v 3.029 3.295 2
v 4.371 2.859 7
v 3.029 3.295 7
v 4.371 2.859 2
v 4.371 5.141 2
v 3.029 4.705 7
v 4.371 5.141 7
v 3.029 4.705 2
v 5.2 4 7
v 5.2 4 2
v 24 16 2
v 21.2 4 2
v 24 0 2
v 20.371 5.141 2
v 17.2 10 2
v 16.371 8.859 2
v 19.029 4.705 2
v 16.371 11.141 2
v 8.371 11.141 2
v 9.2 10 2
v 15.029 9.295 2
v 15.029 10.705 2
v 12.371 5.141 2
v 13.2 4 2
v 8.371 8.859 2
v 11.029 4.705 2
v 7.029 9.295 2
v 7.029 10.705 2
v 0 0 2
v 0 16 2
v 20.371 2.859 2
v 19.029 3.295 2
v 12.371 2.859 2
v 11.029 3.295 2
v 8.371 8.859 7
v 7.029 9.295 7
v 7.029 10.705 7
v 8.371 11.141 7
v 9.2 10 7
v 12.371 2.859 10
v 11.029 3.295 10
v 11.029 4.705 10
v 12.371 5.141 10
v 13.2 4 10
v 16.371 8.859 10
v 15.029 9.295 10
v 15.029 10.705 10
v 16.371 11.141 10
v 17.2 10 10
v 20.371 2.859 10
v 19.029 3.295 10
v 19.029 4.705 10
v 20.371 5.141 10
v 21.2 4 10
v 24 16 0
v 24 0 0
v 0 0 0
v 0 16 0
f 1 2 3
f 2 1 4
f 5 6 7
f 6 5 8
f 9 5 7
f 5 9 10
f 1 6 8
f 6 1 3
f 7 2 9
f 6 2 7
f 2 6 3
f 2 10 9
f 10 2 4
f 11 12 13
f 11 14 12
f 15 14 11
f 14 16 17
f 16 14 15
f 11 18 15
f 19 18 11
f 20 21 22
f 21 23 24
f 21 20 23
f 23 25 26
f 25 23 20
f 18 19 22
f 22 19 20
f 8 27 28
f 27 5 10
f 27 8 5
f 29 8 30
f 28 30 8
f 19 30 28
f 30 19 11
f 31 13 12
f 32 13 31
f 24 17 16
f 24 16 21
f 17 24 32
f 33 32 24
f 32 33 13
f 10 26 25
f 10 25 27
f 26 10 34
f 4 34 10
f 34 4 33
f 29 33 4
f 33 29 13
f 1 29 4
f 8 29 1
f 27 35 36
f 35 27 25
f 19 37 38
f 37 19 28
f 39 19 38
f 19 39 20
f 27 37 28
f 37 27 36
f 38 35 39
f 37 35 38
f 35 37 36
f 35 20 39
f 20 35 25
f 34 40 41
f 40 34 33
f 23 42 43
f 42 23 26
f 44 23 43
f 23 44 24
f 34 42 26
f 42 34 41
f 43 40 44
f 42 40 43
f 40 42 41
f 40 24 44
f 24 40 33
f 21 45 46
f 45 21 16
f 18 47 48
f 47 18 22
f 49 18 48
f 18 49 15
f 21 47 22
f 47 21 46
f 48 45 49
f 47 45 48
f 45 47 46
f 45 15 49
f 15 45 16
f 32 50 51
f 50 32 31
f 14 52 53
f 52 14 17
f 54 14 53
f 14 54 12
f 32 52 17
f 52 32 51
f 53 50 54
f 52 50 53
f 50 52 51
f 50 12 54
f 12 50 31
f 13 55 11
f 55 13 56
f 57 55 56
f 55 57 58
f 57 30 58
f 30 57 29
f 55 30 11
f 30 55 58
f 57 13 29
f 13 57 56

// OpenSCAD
// file: sample_lib.scad
module peg(r=2, h=10) {
  cylinder(r=r, h=h);
}

module base_plate(size=[20, 20, 2]) {
  cube(size);
}
// main file
use <sample_lib.scad>;

pts = [for (i=[0:4]) [4 + i * 4, 4 + (i % 2) * 6]];
heights = [for (i=[0:4]) i < 2 ? 5 : 8];

union() {
  base_plate(size=[24, 16, 2]);
  for (i = [0:4]) {
    translate([pts[i][0], pts[i][1], 2])
      peg(r=1.2, h=heights[i]);
  }
}
